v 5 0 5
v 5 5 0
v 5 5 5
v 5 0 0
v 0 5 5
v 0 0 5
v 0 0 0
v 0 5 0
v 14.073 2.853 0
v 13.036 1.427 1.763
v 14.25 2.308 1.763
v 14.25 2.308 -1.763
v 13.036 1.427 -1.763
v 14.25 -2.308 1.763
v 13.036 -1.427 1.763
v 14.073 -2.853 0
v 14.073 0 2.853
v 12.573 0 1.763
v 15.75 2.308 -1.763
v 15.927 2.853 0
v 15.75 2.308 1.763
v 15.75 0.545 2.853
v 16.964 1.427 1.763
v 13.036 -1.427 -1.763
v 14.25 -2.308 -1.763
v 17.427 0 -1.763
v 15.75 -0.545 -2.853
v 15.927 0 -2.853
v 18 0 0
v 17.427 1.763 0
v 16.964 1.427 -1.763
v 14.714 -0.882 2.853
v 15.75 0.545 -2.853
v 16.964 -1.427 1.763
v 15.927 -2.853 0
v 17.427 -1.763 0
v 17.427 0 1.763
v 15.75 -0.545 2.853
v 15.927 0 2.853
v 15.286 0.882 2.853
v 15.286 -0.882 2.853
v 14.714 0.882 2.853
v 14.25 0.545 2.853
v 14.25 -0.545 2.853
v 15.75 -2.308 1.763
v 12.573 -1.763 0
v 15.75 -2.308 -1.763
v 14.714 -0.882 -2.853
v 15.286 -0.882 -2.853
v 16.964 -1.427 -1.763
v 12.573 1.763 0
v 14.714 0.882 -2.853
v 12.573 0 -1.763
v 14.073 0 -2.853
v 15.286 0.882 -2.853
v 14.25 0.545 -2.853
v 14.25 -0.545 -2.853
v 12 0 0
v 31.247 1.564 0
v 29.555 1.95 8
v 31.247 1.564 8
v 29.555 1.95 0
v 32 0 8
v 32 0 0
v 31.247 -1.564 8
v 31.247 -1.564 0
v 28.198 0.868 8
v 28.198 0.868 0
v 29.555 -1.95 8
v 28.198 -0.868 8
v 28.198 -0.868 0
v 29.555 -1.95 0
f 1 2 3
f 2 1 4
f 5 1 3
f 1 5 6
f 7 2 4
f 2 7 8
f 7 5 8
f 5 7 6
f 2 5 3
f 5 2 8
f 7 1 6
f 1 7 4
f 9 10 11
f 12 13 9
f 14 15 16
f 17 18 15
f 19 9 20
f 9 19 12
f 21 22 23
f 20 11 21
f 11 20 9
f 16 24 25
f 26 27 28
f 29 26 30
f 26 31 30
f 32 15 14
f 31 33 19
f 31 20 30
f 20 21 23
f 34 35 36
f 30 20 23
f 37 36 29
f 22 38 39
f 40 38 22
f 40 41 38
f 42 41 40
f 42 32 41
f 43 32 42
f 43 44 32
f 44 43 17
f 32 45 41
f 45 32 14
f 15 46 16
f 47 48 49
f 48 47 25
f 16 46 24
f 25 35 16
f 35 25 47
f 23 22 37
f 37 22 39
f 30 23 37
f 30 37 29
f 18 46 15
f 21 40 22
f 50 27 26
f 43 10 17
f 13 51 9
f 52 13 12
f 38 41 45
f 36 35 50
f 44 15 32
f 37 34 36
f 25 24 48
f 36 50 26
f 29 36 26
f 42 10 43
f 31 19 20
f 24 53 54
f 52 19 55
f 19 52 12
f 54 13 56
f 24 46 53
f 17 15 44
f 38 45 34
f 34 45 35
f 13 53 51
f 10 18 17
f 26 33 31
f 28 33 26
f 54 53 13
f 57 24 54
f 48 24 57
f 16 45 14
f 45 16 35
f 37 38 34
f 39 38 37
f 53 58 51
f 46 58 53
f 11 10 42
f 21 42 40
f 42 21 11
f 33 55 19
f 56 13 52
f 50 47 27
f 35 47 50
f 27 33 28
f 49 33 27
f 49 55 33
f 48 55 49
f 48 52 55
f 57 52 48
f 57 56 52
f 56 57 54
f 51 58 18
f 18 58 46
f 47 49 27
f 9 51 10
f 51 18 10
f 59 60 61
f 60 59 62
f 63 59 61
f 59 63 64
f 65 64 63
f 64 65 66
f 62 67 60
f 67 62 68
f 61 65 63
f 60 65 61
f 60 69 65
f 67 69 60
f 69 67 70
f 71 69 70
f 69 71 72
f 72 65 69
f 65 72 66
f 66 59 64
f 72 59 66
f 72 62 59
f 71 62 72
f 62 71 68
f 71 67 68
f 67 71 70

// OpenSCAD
// BOSL-style xspread() using children() and $children
module xspread(spacing = 10) {
    for (i = [0 : $children - 1]) {
        translate([i * spacing, 0, 0]) children(i);
    }
}

xspread(15) {
    cube(5);
    sphere(3);
    cylinder(h=8, r=2);
}
